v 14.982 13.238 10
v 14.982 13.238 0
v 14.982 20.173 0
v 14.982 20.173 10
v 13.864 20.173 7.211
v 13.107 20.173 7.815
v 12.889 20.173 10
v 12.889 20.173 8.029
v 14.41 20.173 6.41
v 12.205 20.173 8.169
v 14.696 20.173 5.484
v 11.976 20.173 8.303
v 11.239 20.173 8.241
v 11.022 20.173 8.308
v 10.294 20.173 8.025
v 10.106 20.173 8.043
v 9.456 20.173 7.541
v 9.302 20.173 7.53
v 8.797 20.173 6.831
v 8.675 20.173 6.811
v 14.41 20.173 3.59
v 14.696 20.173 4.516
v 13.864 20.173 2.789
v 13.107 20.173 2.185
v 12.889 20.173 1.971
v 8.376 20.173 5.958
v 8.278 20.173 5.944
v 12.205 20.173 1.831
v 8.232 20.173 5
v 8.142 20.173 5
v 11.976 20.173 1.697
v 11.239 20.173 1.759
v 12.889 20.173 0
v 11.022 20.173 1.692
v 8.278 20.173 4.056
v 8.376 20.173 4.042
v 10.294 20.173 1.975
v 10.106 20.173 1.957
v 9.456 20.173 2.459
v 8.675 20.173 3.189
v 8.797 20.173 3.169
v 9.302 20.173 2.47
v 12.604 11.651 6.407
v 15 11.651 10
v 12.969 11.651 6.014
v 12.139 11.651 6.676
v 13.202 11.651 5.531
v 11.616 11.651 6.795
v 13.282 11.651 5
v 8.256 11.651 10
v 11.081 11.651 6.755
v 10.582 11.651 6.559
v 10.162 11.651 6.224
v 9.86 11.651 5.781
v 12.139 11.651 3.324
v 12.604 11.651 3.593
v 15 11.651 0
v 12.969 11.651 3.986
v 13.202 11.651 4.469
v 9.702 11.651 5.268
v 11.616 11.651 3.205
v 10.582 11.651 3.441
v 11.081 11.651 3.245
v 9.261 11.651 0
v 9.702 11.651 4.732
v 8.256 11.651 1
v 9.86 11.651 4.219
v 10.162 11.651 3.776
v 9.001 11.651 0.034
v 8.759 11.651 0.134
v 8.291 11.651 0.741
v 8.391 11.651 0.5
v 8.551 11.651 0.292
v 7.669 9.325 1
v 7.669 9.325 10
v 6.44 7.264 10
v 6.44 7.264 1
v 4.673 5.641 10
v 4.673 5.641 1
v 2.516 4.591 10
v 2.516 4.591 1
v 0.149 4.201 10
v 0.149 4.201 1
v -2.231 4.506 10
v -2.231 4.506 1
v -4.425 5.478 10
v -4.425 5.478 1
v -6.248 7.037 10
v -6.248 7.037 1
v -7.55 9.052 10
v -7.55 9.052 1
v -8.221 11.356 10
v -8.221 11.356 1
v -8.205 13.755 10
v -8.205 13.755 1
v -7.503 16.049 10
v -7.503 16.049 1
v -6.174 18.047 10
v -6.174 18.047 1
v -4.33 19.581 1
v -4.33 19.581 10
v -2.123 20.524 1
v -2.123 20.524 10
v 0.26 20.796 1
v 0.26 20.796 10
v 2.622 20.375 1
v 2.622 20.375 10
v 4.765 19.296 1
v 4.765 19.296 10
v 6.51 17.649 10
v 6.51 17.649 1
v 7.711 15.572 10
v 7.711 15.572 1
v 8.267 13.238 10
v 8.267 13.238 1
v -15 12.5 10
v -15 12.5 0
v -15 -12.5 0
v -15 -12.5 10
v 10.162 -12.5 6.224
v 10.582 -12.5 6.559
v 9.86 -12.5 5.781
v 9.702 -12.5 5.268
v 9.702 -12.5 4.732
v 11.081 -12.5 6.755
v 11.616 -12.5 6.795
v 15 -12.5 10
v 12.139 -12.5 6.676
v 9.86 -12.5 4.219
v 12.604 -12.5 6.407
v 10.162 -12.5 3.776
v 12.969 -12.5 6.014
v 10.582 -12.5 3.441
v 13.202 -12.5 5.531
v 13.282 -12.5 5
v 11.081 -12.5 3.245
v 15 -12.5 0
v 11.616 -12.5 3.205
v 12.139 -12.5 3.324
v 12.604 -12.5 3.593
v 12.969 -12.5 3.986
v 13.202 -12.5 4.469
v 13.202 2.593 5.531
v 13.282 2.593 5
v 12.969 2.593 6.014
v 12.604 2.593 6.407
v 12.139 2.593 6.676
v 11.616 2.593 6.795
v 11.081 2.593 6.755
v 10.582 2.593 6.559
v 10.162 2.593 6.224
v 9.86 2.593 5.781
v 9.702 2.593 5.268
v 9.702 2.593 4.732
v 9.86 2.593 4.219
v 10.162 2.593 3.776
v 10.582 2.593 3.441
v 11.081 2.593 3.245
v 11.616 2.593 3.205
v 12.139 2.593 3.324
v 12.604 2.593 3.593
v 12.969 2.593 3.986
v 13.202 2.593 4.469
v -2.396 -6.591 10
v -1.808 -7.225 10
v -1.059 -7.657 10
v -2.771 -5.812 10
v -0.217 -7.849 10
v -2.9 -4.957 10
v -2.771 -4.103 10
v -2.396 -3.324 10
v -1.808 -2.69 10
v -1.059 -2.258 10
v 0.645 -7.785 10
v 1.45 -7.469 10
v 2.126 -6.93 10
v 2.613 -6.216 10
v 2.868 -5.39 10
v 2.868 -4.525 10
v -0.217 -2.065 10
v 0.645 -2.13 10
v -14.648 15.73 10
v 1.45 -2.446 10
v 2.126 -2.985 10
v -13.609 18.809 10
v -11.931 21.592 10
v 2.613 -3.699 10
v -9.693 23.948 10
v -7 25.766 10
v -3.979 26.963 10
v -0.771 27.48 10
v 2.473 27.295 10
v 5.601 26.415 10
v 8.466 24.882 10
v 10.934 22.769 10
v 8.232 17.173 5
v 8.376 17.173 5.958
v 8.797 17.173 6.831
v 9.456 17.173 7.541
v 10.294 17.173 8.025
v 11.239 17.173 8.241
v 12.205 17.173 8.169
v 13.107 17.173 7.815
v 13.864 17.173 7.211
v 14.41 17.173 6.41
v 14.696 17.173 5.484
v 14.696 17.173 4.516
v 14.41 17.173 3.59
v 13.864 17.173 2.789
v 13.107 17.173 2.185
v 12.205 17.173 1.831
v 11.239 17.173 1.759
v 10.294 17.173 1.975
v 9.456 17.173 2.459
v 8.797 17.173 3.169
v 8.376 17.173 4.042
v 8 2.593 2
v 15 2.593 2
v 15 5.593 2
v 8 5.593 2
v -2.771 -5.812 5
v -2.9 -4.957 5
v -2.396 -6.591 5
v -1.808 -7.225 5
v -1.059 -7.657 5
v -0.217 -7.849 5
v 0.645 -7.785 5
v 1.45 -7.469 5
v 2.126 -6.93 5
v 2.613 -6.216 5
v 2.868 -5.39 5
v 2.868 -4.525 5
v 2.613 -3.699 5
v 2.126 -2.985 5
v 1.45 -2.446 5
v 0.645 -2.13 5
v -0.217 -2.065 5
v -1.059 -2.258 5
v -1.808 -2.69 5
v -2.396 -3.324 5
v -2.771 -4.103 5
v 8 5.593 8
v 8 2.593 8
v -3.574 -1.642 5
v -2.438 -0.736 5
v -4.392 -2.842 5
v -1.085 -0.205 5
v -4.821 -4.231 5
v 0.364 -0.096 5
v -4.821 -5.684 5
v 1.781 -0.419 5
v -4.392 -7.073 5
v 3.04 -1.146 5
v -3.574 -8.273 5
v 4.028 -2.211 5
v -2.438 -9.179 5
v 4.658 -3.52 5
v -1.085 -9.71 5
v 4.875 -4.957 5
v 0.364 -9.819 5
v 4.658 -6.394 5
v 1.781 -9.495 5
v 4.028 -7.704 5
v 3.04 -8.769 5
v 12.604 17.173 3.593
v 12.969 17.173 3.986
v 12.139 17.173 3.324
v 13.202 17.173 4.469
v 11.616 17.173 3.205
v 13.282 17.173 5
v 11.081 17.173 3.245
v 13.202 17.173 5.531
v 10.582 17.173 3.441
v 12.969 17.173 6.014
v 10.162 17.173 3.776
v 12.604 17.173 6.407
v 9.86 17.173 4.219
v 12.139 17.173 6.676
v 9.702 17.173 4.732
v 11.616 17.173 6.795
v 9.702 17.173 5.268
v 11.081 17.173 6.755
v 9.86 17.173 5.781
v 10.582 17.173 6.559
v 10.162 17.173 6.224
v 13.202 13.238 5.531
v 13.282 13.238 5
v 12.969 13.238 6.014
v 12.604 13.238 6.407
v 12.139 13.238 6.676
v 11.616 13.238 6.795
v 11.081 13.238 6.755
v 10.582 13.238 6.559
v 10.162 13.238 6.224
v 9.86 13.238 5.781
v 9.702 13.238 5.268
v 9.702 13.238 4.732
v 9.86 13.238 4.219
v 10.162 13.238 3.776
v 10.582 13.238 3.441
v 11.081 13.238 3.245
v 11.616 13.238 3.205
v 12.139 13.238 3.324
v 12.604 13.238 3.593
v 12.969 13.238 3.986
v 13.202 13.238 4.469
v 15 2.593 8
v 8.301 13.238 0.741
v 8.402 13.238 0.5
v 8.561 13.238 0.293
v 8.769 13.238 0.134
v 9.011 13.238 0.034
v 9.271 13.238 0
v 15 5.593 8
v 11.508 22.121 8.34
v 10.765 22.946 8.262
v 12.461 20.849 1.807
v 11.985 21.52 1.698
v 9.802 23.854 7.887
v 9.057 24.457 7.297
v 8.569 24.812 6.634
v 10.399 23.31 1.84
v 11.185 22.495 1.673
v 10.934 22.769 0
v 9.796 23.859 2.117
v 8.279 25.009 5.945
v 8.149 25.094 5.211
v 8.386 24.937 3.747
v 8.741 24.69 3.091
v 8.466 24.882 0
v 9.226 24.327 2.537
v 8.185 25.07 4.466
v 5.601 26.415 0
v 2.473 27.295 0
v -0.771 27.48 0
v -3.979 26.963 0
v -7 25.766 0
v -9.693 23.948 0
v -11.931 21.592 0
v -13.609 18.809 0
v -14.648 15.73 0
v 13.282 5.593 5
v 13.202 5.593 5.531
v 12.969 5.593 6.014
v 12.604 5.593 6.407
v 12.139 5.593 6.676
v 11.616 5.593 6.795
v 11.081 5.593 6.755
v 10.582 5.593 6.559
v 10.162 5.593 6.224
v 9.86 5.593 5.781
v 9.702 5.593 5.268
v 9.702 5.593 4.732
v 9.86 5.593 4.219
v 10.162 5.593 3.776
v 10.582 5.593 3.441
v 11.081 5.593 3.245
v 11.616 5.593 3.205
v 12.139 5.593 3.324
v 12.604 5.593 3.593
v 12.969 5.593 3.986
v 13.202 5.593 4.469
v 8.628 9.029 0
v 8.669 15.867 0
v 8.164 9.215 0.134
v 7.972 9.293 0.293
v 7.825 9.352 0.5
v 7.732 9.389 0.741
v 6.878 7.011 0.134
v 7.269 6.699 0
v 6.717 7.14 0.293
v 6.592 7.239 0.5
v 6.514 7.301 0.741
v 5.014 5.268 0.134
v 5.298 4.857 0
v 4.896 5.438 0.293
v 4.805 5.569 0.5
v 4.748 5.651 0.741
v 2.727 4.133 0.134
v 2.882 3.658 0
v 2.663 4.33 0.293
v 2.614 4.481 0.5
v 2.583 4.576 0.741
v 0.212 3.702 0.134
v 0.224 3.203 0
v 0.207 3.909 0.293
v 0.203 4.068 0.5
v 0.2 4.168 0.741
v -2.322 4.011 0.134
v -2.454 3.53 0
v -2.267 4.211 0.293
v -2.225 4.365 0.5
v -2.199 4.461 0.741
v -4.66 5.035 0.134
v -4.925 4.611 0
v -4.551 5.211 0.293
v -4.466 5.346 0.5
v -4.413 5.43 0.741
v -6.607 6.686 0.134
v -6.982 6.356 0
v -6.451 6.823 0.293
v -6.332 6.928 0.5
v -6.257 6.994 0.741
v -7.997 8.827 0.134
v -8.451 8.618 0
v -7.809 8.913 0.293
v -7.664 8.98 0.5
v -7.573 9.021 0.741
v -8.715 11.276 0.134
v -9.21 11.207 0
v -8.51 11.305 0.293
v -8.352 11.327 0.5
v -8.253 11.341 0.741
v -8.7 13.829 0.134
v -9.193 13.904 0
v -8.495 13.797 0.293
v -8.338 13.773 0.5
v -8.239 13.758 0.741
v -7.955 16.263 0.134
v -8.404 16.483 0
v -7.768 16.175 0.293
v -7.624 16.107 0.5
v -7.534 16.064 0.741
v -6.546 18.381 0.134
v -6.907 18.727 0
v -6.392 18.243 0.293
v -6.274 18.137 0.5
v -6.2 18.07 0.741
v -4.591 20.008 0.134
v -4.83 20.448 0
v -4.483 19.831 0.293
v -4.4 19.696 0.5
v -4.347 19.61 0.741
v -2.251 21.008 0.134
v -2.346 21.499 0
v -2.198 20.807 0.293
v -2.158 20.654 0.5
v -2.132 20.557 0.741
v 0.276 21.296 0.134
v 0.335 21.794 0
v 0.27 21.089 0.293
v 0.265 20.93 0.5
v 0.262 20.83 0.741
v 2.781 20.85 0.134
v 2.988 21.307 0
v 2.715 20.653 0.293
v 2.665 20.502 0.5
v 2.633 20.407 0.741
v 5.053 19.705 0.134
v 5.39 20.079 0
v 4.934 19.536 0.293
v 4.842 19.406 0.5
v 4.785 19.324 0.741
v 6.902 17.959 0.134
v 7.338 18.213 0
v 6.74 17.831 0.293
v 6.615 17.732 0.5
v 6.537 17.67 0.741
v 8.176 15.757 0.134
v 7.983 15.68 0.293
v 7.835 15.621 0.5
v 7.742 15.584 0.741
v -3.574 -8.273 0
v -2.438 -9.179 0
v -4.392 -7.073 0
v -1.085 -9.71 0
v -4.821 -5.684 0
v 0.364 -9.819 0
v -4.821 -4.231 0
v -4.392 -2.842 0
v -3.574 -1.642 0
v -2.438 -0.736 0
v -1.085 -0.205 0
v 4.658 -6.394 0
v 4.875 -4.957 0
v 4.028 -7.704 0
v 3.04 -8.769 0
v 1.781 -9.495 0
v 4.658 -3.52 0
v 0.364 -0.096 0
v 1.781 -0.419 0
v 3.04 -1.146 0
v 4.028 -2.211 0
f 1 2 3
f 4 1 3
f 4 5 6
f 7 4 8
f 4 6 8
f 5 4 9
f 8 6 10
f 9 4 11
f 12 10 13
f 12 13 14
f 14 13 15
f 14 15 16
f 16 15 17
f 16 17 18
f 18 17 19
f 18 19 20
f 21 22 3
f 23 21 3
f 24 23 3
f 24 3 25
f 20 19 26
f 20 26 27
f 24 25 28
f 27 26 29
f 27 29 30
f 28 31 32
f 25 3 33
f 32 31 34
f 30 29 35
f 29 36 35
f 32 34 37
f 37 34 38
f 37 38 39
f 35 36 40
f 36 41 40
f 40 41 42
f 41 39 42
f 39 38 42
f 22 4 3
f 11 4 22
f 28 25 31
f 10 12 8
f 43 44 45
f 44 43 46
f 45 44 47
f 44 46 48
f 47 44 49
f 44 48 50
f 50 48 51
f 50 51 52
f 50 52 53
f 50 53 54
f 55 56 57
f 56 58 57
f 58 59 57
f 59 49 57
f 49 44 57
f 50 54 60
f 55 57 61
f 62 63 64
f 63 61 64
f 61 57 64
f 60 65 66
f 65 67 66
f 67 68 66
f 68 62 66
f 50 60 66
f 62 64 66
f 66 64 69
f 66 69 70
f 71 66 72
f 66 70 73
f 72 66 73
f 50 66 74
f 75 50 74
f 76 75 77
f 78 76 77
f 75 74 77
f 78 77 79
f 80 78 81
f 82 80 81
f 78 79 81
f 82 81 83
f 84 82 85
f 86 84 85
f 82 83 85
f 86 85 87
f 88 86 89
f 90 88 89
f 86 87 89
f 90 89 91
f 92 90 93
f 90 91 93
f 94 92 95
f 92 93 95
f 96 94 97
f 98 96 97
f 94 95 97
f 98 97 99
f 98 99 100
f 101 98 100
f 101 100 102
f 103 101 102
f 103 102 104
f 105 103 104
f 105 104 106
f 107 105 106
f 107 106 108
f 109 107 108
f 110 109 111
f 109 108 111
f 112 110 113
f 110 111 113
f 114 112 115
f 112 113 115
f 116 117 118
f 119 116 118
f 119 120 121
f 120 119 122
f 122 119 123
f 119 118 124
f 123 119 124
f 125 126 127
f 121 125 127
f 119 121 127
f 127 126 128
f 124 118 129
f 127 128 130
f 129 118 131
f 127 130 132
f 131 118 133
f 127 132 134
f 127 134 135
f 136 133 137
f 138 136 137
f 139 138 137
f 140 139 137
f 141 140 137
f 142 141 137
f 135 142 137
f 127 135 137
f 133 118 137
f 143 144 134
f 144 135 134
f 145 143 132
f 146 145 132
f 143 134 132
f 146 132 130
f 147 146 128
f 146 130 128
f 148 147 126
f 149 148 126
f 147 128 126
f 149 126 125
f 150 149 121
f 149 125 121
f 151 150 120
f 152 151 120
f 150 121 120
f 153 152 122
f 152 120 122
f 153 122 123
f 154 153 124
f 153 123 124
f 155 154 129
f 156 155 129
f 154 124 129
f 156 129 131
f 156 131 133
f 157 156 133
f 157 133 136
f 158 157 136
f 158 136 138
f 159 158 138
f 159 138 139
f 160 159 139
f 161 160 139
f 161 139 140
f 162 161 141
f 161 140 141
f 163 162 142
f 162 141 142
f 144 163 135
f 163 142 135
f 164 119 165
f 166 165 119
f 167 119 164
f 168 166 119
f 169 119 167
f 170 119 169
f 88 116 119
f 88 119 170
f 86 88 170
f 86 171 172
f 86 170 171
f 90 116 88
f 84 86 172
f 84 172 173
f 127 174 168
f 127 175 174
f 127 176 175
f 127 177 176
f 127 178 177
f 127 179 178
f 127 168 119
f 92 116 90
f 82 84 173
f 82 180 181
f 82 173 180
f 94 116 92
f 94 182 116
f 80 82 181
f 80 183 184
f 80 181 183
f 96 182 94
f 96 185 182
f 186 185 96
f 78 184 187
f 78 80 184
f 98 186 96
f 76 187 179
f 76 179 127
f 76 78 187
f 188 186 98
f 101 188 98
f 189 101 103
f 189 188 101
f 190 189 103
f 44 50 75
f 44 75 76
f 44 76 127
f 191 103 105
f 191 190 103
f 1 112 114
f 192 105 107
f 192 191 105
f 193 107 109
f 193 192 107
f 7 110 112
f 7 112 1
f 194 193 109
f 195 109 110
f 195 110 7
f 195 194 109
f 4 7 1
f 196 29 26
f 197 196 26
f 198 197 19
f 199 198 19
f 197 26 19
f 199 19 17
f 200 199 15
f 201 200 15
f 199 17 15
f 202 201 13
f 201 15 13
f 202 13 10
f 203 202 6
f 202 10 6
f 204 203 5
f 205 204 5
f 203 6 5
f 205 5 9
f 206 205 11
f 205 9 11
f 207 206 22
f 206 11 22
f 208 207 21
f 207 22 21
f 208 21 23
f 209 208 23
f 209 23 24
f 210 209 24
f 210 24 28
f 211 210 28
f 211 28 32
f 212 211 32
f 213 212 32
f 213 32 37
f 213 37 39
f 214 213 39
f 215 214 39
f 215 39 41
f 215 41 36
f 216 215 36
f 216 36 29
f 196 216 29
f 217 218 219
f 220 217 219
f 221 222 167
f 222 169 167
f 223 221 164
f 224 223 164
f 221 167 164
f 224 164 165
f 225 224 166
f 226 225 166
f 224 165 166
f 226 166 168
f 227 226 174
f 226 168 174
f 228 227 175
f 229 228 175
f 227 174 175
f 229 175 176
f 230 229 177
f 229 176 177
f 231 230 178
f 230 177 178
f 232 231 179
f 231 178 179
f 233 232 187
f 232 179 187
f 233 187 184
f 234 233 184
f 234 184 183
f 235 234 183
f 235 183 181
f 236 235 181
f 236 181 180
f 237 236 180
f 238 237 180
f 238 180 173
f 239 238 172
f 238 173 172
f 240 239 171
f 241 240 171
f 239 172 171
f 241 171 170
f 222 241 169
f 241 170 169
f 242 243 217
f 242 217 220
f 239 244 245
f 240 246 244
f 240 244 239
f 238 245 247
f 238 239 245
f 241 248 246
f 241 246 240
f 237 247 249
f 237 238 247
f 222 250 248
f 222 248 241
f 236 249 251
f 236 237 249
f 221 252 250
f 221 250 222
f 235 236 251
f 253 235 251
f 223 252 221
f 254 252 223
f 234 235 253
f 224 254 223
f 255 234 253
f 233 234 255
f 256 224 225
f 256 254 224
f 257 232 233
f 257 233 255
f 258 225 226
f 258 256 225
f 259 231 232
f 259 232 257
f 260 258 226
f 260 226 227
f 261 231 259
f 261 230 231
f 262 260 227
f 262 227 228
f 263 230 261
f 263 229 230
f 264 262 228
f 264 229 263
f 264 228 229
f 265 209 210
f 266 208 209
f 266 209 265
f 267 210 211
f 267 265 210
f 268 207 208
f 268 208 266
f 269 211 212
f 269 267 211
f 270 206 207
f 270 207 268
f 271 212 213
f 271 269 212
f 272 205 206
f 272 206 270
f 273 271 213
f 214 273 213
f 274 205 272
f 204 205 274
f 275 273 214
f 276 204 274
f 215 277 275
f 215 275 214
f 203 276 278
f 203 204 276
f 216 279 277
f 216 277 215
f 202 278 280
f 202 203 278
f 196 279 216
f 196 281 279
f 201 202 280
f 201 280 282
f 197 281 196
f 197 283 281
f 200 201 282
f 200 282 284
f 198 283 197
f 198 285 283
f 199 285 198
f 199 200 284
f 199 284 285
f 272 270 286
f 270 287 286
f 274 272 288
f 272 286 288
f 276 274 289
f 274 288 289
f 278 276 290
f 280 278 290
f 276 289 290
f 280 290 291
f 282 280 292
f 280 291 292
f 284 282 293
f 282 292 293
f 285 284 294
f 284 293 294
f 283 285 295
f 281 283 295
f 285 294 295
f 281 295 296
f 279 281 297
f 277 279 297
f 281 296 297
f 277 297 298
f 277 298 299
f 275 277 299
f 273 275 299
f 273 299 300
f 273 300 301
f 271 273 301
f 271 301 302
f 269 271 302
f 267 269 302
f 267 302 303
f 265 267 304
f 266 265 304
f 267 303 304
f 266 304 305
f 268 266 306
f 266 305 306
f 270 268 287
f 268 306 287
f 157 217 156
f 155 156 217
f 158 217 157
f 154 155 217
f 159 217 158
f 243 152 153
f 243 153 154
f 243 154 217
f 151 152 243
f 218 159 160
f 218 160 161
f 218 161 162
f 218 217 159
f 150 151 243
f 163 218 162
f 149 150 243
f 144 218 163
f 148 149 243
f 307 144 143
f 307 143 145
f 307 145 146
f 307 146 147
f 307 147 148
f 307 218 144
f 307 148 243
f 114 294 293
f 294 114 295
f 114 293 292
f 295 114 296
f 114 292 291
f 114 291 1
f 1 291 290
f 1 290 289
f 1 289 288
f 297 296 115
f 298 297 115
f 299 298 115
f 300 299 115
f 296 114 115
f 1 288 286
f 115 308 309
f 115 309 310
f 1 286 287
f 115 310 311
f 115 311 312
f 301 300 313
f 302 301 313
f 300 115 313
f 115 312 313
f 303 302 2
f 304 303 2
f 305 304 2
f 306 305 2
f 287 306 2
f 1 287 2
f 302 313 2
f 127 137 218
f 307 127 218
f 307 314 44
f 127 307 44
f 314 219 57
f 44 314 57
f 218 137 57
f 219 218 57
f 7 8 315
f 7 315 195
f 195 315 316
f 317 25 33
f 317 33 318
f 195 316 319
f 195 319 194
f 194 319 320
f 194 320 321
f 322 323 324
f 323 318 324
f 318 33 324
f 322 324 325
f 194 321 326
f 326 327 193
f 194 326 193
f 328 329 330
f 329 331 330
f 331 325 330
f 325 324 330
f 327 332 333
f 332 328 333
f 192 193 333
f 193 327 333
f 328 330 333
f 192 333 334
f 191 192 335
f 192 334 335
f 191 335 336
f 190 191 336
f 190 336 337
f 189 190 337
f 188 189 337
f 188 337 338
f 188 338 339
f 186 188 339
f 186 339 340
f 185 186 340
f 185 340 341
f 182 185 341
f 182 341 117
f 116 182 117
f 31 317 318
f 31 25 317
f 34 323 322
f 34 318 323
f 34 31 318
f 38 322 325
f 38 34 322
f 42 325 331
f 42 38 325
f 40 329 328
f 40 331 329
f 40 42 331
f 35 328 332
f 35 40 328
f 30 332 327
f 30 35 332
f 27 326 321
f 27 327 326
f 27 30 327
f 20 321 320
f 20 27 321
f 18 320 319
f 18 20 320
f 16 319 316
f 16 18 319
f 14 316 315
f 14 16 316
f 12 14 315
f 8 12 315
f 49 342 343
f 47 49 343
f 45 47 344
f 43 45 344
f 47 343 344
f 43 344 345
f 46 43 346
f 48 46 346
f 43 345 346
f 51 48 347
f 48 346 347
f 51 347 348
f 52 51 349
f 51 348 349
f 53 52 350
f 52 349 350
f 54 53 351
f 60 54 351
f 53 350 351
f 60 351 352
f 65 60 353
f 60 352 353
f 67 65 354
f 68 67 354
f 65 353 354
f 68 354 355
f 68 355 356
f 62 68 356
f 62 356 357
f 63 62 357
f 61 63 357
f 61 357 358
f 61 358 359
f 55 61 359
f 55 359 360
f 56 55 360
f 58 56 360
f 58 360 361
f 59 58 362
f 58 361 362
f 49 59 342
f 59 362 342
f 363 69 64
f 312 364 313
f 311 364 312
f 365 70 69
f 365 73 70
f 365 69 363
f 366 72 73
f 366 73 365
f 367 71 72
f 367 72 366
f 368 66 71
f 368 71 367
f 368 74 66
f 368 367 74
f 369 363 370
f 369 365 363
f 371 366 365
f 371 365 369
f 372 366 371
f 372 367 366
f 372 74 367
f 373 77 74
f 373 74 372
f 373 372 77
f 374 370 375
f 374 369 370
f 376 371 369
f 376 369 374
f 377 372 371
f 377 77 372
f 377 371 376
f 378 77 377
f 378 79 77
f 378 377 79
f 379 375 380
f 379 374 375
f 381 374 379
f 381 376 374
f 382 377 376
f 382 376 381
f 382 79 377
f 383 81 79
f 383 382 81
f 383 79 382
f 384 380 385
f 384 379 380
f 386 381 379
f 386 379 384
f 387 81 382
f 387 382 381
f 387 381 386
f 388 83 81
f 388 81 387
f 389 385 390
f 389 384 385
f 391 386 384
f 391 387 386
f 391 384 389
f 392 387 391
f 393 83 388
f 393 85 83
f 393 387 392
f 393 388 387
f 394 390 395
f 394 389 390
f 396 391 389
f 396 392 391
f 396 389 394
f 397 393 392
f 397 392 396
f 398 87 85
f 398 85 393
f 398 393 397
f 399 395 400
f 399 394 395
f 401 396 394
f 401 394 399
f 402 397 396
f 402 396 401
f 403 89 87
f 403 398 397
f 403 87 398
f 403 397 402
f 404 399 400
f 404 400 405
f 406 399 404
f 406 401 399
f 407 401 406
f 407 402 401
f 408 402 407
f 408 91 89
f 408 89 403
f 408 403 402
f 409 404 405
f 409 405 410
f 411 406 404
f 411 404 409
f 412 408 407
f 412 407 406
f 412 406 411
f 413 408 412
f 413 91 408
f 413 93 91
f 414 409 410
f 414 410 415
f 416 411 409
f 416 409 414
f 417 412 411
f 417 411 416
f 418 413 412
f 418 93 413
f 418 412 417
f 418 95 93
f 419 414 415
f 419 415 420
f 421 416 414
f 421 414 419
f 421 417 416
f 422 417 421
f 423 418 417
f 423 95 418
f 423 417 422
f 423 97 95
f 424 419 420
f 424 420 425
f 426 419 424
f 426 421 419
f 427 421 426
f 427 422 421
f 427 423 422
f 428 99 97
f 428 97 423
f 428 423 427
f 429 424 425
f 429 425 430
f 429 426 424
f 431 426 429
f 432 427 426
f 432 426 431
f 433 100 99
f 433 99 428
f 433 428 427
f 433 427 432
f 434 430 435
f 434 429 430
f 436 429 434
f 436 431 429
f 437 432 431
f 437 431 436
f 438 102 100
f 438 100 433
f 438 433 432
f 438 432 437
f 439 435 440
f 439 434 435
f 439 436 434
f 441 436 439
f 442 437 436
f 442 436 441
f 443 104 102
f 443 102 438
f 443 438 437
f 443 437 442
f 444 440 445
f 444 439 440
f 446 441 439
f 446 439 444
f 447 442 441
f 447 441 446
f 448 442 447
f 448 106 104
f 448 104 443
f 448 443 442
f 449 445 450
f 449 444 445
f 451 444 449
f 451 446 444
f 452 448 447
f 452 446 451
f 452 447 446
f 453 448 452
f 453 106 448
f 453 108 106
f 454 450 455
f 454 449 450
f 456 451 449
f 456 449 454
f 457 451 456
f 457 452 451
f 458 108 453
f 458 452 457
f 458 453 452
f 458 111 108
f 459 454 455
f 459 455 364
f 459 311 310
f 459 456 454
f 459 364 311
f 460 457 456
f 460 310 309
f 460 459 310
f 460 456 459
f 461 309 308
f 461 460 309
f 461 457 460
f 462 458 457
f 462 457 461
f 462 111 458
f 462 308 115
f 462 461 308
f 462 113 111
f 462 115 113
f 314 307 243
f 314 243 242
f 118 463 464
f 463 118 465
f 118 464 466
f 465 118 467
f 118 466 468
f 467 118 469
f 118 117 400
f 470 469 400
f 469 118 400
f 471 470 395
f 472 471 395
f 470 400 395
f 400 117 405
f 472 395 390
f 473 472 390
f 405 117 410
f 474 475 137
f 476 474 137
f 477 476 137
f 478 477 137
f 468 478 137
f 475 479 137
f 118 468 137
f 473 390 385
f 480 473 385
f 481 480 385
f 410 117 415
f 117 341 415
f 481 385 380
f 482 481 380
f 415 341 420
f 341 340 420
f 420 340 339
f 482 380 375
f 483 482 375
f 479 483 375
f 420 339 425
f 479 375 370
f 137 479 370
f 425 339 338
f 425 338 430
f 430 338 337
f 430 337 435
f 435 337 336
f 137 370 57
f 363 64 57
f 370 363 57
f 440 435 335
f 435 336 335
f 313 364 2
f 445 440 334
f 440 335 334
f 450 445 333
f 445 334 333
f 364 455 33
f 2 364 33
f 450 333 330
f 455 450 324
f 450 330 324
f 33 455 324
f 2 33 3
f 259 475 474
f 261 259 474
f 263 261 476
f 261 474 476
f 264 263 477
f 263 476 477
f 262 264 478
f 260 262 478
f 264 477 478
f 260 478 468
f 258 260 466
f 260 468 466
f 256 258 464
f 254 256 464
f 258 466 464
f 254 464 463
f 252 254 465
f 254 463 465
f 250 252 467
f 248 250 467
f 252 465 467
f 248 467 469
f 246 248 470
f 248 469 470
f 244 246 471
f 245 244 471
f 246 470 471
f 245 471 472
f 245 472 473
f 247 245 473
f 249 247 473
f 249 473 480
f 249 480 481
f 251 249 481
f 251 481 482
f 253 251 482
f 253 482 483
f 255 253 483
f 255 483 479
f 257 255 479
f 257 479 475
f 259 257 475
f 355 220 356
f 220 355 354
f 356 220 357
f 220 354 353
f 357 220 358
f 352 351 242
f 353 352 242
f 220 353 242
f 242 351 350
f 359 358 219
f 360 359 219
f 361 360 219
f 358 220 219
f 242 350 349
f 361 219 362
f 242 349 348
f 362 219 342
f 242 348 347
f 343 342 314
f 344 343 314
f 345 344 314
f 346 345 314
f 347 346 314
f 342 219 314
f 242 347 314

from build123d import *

# Parameters (mm, degrees)
F1_DEPTH       = 10
F3_D           = 5.8
F3_CBORE_D     = 9.75
F3_CBORE_DEPTH = 5
F4_R           = 3.3399169876
F5_DEPTH       = 25
F6_D           = 3.6
F6_CBORE_D     = 6.5
F6_CBORE_DEPTH = 3
F7_W           = 3
F7_H           = 6
F8_DEPTH       = 7
F9_R           = 1


with BuildPart() as f1:
    # F0 (on Top) → F1 (new body)
    with BuildSketch(Plane.XY):
        with BuildLine():
            Line((-15, 12.5), (-15, -12.5))
            Line((-15, -12.5), (15, -12.5))
            Line((15, -12.5), (15, 11.6508761421))
            Line((15, 11.6508761421), (8.2564513366, 11.6508761421))
            ThreePointArc((8.2564513366, 11.6508761421), (-8.2998116615, 12.5559140775), (8.2671421606, 13.2378078997))
            Line((8.2671421606, 13.2378078997), (14.9818436617, 13.2378078997))
            Line((14.9818436617, 13.2378078997), (14.9818436617, 20.172925666))
            Line((14.9818436617, 20.172925666), (12.8889957609, 20.172925666))
            ThreePointArc((12.8889957609, 20.172925666), (-3.979011409, 26.962623144), (-15, 12.5))
        make_face()
    extrude(amount=F1_DEPTH)

    # F3 (through all)
    with Locations(Plane(origin=(0, 0, 0), x_dir=(1, 0, 0), z_dir=(0, 0, -1))):
        with Locations((0, 4.9573802389)):
            CounterBoreHole(F3_D / 2, F3_CBORE_D / 2, F3_CBORE_DEPTH)

    # F4 (on face) → F5 (cut)
    with BuildSketch(Plane(origin=(0, 20.172925666, 0), x_dir=(-1, 0, 0), z_dir=(0, 1, 0))):
        with Locations((-11.4818436617, 5)):
            Circle(F4_R)
    extrude(amount=F5_DEPTH, mode=Mode.SUBTRACT)

    # F6 (through all)
    with Locations(Plane(origin=(0, 20.172925666, 0), x_dir=(-1, 0, 0), z_dir=(0, 1, 0))):
        with Locations((-11.4818436617, 5)):
            CounterBoreHole(F6_D / 2, F6_CBORE_D / 2, F6_CBORE_DEPTH)

    # F7 (on face) → F8 (cut)
    with BuildSketch(Plane.YZ.offset(15)):
        with Locations((4.0933839045, 5)):
            Rectangle(F7_W, F7_H)
    extrude(amount=-F8_DEPTH, mode=Mode.SUBTRACT)

    # F9
    f9_edges = [f1.edges().sort_by_distance(p)[0] for p in [
        (-8.299812, 12.555914, 0),
    ]]
    fillet(f9_edges, radius=F9_R)


solid = f1.part
